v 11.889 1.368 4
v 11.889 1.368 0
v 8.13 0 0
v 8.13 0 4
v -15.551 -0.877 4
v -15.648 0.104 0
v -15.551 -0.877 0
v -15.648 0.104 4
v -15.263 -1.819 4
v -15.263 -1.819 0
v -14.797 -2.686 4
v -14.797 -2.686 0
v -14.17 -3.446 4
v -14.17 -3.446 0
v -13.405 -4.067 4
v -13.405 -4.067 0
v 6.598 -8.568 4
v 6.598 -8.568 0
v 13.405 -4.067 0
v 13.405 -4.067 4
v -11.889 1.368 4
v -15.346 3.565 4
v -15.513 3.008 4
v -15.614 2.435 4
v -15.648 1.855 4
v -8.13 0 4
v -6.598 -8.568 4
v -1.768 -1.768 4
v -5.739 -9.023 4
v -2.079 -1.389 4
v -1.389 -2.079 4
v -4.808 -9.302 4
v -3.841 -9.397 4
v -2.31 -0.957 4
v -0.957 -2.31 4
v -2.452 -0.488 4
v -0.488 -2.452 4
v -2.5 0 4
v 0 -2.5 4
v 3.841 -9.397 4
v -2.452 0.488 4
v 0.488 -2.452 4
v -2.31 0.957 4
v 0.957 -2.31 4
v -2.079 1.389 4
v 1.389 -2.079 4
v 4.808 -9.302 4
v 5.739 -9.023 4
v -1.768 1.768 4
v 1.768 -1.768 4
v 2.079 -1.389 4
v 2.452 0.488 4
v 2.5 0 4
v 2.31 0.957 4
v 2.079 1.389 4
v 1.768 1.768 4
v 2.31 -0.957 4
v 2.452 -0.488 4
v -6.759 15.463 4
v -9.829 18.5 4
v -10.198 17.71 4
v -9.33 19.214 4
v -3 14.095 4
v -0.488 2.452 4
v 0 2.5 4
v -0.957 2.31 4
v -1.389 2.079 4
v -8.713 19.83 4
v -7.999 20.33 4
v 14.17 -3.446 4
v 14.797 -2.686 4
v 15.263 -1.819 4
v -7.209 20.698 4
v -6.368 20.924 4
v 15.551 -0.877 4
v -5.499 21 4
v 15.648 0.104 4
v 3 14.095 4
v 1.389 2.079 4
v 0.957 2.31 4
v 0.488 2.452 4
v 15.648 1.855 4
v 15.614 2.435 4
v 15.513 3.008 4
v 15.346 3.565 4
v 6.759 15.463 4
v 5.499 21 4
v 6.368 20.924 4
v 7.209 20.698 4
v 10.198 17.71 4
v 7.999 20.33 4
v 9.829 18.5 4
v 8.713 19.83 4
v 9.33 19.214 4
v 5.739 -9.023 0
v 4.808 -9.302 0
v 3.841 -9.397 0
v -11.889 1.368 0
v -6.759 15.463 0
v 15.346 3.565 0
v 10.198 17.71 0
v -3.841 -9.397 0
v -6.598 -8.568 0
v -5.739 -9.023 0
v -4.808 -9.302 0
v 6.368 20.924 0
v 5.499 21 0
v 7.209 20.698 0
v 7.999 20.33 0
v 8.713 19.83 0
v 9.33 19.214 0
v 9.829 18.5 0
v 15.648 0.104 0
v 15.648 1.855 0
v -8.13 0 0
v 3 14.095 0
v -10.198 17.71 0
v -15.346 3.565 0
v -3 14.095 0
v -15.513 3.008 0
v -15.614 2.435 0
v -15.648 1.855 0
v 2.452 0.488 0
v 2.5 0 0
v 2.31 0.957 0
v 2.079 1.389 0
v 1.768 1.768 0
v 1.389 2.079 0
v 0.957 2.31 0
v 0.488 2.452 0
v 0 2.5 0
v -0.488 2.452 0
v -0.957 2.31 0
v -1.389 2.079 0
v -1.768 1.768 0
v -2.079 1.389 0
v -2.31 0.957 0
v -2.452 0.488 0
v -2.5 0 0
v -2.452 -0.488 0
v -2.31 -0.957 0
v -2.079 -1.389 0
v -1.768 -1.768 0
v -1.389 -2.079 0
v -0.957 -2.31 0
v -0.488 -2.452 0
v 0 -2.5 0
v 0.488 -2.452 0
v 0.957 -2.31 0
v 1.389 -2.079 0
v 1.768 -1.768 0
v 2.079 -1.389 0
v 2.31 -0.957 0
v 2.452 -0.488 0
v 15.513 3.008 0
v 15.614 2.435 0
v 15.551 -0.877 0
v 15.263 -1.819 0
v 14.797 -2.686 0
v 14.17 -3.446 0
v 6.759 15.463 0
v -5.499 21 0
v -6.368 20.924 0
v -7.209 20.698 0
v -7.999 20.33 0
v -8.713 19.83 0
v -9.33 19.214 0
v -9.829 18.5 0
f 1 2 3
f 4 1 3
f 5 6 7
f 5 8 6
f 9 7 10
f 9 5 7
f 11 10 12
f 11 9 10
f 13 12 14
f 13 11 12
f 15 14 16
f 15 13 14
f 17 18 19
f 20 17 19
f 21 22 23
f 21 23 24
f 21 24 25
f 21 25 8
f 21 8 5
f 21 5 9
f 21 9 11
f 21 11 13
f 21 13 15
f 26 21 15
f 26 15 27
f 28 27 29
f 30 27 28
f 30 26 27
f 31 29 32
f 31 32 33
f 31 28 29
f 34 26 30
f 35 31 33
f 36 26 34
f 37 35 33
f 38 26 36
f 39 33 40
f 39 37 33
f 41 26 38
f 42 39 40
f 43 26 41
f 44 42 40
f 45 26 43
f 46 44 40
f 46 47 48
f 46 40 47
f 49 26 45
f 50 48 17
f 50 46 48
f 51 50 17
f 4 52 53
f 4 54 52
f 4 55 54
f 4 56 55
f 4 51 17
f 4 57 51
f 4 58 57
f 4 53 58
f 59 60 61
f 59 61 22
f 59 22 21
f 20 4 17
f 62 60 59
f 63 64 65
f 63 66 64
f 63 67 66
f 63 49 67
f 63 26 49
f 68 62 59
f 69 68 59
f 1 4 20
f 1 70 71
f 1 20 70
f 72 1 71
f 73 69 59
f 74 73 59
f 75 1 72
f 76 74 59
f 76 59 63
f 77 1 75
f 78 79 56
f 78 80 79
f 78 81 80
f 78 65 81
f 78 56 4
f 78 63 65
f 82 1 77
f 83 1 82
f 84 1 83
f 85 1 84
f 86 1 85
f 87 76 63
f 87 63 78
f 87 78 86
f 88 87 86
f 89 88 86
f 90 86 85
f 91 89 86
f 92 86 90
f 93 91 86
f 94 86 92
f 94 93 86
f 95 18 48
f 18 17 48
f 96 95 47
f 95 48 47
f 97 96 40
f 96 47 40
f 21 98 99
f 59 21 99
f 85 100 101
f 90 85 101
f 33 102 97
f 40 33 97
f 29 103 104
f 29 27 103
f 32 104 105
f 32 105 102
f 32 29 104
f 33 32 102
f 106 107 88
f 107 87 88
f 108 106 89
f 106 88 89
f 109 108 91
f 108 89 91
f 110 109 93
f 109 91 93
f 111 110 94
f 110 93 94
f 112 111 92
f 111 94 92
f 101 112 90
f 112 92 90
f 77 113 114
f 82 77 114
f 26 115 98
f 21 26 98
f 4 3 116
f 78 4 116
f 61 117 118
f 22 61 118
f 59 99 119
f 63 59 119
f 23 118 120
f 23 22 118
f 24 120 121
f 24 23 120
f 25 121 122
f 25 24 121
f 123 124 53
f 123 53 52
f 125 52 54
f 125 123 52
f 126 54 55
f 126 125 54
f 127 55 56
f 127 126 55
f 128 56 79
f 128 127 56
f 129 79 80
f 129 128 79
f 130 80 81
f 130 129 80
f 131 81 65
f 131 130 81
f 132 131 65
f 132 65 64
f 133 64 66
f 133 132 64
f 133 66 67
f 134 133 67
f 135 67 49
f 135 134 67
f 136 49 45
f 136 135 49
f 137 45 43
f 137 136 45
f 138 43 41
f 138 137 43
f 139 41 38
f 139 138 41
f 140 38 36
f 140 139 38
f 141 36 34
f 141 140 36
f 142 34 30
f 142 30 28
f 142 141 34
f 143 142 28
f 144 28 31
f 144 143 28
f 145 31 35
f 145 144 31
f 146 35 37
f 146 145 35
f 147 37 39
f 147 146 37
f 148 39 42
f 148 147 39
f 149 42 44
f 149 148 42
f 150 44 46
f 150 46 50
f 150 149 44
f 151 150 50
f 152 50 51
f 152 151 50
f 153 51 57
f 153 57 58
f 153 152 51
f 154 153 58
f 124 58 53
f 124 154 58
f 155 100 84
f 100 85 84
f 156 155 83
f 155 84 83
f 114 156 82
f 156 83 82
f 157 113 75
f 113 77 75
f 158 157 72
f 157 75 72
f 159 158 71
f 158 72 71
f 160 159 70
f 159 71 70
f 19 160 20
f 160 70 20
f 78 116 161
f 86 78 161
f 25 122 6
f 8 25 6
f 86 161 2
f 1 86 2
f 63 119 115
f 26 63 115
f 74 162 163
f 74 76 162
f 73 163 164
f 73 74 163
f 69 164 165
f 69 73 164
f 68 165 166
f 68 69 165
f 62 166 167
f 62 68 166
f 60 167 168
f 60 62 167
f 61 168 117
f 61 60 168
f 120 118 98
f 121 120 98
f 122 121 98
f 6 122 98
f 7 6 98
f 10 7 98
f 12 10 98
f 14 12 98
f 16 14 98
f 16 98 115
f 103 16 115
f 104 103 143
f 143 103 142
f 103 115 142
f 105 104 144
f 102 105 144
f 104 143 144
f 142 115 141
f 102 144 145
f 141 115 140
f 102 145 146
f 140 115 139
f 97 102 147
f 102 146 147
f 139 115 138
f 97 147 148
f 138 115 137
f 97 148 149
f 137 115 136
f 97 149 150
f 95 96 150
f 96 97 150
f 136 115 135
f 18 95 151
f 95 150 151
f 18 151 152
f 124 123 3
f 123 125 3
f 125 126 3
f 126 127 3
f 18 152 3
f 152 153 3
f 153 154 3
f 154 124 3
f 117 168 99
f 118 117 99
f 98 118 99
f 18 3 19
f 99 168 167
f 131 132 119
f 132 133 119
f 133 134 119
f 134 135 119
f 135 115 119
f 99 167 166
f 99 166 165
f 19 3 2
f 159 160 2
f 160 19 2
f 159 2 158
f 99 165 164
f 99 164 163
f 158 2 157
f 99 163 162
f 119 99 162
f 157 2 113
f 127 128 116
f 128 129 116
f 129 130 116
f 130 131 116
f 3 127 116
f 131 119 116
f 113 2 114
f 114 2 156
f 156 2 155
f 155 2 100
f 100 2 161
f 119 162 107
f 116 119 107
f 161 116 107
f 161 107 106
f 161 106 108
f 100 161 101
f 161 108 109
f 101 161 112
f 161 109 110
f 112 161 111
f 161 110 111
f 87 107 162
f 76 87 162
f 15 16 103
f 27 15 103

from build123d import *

# Parameters (mm, degrees)
SKETCH_1_R      = 2.5
EXTRUDE_1_DEPTH = 4
FILLET_1_R      = 5


with BuildPart() as part:
    # ｽｹｯﾁ1 → ﾎﾞｽ - 押し出し1 (new body)
    with BuildSketch(Plane.XY):
        Polygon((9.00034941, 21), (-9.00034941, 21), (-15.647843116, 2.736161147), (-15.647843116, -2.584727716), (-5.344155371, -9.396926208), (5.344155371, -9.396926208), (15.647843116, -2.584727716), (15.647843116, 2.736161147), align=None)
        Circle(SKETCH_1_R, mode=Mode.SUBTRACT)
        Polygon((-11.889072633, 1.368080573), (-6.758770483, 15.463469885), (-3, 14.095389312), (-8.13030215, 0), align=None, mode=Mode.SUBTRACT)
        Polygon((8.13030215, 0), (3, 14.095389312), (6.758770483, 15.463469885), (11.889072633, 1.368080573), align=None, mode=Mode.SUBTRACT)
    extrude(amount=EXTRUDE_1_DEPTH)

    # ﾌｨﾚｯﾄ1
    fillet_1_edges = [part.edges().sort_by_distance(p)[0] for p in [
        (-15.647843116, 2.736161147, 2),
        (-9.00034941, 21, 2),
        (9.00034941, 21, 2),
        (15.647843116, 2.736161147, 2),
        (15.647843116, -2.584727716, 2),
        (5.344155371, -9.396926208, 2),
        (-5.344155371, -9.396926208, 2),
        (-15.647843116, -2.584727716, 2),
    ]]
    fillet(fillet_1_edges, radius=FILLET_1_R)


solid = part.part
